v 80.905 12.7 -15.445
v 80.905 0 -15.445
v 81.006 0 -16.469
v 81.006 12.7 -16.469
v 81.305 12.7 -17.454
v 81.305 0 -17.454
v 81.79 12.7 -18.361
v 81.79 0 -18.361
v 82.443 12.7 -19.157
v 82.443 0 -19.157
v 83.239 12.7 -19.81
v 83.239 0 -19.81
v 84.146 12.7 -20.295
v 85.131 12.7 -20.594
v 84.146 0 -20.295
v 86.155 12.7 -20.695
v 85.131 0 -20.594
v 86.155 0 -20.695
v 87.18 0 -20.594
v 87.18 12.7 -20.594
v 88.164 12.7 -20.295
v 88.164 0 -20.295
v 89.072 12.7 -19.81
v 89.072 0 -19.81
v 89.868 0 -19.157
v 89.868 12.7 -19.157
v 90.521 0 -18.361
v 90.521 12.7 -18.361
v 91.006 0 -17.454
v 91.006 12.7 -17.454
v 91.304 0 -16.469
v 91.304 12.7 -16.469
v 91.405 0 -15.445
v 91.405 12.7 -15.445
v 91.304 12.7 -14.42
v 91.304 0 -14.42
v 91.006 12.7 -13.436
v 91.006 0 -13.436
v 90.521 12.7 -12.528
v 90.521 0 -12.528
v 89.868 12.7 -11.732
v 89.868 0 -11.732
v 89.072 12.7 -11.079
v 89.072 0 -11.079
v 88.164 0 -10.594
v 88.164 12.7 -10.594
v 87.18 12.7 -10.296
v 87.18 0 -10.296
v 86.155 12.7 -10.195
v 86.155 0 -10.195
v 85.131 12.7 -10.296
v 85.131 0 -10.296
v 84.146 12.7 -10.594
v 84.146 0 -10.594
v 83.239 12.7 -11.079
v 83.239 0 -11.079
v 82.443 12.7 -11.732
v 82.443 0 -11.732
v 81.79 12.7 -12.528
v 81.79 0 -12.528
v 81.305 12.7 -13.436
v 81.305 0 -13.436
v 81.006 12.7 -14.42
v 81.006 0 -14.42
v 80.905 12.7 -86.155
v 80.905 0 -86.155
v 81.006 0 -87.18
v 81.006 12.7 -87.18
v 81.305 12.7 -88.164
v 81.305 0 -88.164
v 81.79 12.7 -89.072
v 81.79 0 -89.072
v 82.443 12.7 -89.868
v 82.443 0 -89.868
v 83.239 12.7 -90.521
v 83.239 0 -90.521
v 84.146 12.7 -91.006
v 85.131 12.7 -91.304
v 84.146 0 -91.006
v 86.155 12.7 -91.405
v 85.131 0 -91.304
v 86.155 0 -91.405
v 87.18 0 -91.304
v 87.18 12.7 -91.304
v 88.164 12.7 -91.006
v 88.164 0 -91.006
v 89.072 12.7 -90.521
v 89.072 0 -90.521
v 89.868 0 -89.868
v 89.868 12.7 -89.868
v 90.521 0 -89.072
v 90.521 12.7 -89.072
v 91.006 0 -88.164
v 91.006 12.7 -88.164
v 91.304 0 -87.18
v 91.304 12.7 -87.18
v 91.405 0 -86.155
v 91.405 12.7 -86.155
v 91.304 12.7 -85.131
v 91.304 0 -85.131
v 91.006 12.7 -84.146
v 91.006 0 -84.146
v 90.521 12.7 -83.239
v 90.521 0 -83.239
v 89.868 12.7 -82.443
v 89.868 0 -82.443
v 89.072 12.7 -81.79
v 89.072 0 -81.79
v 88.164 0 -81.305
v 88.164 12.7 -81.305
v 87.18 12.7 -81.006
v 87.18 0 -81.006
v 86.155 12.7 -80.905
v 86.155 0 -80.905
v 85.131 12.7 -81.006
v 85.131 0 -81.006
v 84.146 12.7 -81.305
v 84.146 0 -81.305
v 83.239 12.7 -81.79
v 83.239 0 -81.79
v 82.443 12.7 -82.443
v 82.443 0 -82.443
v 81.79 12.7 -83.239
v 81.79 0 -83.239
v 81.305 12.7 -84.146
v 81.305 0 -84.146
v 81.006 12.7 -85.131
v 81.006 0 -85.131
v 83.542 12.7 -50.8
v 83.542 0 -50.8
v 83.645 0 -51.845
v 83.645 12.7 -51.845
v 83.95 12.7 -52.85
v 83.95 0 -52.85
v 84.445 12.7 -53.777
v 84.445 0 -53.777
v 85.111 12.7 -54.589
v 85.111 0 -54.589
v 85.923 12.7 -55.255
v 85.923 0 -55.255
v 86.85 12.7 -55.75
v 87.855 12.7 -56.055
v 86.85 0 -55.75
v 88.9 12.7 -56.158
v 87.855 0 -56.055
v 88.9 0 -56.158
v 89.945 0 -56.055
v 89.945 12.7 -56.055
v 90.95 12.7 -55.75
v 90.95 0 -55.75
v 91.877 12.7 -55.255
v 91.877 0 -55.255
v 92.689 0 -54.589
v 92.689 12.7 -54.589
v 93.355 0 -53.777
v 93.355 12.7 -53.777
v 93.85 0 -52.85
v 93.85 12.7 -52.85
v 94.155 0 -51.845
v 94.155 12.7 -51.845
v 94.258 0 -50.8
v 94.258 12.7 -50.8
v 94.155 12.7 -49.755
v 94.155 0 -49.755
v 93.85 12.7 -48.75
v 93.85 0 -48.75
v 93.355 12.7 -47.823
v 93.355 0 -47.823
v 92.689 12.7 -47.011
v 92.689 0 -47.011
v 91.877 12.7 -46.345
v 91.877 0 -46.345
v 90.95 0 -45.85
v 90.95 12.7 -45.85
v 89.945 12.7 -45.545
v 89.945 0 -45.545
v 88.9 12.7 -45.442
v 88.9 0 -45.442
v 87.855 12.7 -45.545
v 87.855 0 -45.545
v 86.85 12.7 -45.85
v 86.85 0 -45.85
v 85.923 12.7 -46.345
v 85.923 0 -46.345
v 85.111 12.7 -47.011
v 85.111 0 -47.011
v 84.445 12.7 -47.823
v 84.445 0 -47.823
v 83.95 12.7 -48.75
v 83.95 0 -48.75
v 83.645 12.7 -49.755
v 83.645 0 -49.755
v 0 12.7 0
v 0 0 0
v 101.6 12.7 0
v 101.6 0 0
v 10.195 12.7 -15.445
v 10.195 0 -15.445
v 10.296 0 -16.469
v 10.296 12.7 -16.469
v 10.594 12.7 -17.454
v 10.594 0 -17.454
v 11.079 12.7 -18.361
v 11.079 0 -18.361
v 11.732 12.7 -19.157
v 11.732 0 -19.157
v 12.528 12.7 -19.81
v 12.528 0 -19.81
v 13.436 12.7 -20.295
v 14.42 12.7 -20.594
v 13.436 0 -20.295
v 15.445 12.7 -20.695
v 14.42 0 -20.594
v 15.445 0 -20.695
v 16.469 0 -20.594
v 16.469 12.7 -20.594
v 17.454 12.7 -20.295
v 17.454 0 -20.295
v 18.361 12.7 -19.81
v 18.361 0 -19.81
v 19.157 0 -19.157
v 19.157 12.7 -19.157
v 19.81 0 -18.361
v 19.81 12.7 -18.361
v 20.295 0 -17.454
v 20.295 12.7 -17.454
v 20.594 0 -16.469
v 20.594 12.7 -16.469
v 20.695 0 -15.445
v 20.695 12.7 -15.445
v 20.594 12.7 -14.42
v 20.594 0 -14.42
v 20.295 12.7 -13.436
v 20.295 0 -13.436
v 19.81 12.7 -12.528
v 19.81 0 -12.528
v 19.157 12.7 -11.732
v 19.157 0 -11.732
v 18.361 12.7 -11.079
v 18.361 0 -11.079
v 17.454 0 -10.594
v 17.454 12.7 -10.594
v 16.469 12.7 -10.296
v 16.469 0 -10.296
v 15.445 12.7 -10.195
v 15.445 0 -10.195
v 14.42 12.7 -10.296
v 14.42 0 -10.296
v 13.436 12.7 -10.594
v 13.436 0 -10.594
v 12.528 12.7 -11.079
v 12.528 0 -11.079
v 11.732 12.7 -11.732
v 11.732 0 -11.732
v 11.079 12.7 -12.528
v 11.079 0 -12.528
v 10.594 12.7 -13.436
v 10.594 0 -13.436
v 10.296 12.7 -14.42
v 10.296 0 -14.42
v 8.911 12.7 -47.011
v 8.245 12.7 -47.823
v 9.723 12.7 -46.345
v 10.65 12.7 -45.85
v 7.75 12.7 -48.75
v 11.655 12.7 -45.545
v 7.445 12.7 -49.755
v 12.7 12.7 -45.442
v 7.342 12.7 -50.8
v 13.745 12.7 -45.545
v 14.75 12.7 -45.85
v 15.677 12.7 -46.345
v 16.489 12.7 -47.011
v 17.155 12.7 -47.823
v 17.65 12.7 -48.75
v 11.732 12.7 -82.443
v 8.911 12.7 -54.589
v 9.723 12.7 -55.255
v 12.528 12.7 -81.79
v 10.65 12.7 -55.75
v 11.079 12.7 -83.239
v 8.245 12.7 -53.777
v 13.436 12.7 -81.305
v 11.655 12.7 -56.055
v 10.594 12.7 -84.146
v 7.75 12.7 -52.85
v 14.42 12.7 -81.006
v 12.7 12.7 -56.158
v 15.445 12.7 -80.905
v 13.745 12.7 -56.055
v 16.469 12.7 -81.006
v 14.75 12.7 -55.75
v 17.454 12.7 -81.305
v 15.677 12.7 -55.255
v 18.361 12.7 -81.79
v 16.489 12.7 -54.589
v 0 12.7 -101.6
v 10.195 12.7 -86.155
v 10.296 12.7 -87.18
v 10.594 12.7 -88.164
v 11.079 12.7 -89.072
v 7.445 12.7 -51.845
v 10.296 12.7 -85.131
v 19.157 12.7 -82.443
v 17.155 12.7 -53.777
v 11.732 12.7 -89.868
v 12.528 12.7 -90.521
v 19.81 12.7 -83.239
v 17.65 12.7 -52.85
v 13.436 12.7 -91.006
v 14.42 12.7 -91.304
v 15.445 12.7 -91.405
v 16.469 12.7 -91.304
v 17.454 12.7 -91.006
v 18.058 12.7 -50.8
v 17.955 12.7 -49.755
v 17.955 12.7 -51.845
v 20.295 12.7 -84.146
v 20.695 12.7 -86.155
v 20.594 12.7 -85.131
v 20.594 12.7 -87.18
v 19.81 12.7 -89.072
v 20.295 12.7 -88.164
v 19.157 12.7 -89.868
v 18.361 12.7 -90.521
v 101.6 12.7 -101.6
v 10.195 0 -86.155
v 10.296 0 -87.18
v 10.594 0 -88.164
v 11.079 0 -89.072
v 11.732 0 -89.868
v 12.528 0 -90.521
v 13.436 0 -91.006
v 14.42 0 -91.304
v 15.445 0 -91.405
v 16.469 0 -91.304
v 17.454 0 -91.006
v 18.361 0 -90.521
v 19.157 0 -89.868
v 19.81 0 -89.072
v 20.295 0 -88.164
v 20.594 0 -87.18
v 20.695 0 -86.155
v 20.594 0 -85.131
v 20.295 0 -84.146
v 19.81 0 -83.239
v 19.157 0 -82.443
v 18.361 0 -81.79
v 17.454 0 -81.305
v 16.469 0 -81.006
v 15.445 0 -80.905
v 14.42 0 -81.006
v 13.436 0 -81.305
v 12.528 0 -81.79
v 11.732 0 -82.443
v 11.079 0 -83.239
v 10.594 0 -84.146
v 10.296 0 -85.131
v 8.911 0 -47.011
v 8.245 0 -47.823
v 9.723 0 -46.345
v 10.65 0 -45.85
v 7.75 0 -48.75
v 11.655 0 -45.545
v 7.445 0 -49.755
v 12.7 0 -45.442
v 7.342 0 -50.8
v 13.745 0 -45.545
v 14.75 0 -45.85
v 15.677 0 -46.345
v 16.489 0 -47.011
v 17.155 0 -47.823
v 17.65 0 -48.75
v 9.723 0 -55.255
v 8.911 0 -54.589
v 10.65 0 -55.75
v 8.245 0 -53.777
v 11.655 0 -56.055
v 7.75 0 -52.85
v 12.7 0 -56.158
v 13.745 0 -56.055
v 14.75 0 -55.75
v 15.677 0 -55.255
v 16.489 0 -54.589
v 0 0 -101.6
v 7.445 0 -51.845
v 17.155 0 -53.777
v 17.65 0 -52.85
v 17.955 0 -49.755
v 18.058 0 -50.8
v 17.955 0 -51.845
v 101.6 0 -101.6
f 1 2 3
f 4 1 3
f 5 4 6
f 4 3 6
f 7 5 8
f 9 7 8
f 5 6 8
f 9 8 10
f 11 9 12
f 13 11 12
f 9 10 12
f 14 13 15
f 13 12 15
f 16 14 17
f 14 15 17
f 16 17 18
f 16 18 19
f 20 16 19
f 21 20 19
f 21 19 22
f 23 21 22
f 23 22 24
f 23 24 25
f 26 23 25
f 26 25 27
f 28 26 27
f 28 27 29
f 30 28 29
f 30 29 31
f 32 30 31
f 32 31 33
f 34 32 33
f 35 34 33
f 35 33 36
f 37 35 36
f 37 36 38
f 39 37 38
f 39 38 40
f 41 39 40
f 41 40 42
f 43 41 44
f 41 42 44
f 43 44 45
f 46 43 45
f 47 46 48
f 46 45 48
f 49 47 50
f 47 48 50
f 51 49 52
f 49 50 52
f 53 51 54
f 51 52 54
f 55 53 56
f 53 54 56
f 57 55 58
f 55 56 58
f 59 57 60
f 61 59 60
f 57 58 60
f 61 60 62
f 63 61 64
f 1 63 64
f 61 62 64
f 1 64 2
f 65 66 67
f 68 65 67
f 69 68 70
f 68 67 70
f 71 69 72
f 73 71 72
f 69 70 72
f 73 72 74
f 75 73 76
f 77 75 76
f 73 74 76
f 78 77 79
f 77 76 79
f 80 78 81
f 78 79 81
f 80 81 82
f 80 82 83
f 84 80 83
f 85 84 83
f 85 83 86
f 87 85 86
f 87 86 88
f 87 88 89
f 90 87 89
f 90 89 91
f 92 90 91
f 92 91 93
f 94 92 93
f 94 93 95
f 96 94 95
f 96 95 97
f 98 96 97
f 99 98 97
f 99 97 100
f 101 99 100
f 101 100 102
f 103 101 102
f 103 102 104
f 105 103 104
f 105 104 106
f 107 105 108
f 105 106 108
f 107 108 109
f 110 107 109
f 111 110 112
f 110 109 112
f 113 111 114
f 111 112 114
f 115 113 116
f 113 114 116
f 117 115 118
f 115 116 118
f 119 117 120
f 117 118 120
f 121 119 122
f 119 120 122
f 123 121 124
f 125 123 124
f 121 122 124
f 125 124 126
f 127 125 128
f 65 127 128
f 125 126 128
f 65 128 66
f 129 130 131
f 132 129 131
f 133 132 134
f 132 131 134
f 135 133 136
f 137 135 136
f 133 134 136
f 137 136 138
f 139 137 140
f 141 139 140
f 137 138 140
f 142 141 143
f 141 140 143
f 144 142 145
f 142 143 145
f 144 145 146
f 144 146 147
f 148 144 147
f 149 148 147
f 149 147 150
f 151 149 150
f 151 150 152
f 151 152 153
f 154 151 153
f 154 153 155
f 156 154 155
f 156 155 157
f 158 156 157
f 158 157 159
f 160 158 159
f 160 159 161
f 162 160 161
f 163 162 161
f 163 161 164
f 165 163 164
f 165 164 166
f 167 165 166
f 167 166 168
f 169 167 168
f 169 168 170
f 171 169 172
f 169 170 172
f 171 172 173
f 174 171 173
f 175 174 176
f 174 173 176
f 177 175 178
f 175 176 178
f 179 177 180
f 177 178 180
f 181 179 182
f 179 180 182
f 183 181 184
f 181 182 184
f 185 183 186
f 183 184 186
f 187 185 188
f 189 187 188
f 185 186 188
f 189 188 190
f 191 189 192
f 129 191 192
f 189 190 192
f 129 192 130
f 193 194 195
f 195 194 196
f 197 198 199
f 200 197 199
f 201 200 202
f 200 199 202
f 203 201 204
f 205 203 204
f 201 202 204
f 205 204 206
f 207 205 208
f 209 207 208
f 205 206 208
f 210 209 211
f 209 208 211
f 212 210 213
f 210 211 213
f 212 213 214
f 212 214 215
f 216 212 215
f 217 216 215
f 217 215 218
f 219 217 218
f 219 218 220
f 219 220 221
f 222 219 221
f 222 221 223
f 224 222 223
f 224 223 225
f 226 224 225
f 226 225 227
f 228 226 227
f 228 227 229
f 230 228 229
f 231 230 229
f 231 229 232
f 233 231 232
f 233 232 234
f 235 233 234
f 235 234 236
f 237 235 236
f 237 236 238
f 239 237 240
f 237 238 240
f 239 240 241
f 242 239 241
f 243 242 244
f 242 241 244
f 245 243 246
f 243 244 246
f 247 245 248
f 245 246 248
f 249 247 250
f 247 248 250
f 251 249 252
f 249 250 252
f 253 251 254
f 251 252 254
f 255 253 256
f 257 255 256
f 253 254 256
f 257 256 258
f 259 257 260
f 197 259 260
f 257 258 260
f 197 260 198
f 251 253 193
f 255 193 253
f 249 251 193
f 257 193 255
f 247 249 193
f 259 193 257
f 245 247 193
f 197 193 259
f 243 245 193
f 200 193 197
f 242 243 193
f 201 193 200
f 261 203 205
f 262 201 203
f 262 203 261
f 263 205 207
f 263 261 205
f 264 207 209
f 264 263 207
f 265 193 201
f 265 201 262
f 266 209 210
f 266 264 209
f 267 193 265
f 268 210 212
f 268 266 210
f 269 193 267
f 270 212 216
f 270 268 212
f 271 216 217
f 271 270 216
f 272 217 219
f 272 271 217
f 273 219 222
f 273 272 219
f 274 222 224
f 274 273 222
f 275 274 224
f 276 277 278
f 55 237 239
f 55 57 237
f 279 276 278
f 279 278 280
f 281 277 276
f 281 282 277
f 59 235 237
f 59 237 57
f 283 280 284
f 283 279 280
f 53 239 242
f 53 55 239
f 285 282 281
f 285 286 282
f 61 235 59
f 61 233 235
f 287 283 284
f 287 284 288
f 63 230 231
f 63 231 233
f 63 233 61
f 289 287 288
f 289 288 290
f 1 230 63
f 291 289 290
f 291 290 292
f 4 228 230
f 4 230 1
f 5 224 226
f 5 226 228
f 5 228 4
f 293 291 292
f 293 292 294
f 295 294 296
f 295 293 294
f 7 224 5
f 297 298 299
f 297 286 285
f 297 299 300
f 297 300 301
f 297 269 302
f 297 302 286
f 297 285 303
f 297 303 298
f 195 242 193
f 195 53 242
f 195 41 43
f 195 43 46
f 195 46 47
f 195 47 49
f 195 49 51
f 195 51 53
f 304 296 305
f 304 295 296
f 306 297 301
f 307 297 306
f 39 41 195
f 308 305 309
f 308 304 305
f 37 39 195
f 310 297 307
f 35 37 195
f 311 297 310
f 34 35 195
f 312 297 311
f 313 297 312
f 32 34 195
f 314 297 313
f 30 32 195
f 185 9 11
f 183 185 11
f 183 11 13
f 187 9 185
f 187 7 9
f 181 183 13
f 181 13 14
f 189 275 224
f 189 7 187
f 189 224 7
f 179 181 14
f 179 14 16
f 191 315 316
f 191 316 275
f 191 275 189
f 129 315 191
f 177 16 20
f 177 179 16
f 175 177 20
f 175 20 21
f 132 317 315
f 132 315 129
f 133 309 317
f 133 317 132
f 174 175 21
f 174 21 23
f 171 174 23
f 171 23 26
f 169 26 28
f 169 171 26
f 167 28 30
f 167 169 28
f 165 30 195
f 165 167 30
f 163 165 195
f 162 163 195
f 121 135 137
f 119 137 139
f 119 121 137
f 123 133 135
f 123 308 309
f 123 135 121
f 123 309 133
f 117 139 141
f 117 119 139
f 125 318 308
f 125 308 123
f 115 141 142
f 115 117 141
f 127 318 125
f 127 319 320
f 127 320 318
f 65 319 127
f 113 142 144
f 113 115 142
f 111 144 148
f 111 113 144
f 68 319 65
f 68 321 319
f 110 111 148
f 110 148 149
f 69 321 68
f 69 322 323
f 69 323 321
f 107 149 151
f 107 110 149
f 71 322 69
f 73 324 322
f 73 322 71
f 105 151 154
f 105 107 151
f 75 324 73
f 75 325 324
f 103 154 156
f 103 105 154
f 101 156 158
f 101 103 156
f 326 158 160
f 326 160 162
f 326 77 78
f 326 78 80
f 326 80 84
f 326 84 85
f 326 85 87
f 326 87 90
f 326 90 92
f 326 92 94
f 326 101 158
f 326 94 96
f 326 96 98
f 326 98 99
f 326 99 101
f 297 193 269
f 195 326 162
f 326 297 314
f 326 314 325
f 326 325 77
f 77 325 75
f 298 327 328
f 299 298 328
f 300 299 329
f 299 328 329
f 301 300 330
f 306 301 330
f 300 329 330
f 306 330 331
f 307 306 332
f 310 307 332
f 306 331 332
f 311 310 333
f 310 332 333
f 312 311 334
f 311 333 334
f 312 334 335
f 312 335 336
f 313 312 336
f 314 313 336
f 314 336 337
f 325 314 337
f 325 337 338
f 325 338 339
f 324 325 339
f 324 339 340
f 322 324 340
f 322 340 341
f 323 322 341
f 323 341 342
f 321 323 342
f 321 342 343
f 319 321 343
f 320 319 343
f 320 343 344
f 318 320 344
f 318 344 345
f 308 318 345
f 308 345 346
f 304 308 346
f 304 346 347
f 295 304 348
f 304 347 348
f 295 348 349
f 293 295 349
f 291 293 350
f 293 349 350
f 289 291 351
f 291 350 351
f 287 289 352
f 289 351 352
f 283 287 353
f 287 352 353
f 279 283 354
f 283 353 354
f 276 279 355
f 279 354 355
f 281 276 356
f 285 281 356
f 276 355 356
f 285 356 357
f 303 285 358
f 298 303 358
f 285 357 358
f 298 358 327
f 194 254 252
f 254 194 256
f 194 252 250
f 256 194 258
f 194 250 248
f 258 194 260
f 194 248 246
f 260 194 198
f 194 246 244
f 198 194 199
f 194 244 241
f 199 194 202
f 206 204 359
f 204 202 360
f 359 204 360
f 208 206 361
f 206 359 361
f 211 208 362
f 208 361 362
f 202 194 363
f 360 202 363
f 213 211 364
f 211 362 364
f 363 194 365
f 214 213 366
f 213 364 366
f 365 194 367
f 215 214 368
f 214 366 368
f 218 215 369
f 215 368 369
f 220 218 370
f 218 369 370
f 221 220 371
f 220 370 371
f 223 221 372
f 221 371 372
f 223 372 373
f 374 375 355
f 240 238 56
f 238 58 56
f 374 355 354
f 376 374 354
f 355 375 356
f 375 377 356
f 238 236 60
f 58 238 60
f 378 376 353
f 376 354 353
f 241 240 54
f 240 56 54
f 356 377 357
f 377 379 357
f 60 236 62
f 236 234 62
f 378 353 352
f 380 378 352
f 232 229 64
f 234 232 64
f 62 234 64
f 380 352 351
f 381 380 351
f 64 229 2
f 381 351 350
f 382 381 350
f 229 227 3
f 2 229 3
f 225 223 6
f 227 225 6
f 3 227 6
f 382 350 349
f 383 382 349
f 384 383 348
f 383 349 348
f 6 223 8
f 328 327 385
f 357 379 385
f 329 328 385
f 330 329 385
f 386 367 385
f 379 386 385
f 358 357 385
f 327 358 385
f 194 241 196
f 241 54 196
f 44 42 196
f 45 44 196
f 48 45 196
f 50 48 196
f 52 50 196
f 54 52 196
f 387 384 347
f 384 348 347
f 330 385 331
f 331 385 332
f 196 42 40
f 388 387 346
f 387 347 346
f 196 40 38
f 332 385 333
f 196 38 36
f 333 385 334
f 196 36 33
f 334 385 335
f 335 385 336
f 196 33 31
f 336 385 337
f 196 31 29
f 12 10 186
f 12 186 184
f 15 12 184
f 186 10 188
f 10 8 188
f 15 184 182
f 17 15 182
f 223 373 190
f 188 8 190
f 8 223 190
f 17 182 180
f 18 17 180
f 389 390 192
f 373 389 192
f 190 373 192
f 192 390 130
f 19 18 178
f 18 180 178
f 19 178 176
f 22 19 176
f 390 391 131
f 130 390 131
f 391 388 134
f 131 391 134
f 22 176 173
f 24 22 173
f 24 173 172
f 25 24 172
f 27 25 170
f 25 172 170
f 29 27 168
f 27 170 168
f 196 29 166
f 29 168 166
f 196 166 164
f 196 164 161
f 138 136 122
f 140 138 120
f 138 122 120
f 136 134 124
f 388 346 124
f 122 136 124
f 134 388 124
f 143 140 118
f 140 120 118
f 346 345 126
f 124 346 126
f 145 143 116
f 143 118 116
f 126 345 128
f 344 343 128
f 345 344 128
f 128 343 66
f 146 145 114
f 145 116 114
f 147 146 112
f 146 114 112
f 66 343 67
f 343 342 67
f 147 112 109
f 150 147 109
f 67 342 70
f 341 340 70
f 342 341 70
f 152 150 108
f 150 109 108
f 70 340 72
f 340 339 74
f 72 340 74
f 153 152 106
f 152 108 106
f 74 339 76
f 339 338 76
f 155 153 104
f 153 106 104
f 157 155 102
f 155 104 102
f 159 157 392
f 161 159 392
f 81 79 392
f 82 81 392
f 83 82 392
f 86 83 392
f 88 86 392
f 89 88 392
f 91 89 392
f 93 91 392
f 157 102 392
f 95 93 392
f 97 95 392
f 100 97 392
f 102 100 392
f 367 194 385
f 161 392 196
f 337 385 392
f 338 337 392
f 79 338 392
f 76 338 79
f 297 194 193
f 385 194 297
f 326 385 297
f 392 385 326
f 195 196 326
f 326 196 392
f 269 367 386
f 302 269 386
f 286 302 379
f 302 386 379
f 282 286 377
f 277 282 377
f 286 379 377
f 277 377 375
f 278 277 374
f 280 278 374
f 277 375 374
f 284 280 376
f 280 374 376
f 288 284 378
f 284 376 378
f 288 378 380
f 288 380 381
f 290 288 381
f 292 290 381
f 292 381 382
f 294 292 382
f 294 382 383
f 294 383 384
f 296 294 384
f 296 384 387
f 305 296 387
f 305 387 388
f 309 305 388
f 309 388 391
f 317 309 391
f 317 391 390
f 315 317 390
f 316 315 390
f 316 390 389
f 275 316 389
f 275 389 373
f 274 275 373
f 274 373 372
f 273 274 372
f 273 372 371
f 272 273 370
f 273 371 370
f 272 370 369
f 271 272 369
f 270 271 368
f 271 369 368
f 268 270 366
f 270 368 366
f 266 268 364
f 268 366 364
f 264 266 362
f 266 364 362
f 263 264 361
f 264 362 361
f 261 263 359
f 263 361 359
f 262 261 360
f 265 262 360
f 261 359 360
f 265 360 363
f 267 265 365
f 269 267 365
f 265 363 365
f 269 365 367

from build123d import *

# Parameters (mm, degrees)
SKETCH1_W               = 101.6
SKETCH1_H               = 101.6
BOSS_EXTRUDE1_DEPTH     = 12.7
M10_CLEARANCE_HOLE1_D   = 10.5
F_1_2_13_TAPPED_HOLE1_D = 10.71626


with BuildPart() as part:
    # Sketch1 → Boss-Extrude1 (new body)
    with BuildSketch(Plane(origin=(0, 0, 0), x_dir=(1, 0, 0), z_dir=(0, 1, 0))):
        with Locations((50.8, 50.8)):
            Rectangle(SKETCH1_W, SKETCH1_H)
    extrude(amount=BOSS_EXTRUDE1_DEPTH)

    # M10 Clearance Hole1 (through all)
    with Locations(Plane(origin=(0, 12.7, 0), x_dir=(1, 0, 0), z_dir=(0, 1, 0))):
        with Locations((86.155339059, 86.155339059), (86.155339059, 15.444660941), (15.444660941, 86.155339059), (15.444660941, 15.444660941)):
            Hole(M10_CLEARANCE_HOLE1_D / 2)

    # 1/2-13 Tapped Hole1 (through all)
    with Locations(Plane(origin=(0, 12.7, 0), x_dir=(1, 0, 0), z_dir=(0, 1, 0))):
        with Locations((88.9, 50.8), (12.7, 50.8)):
            Hole(F_1_2_13_TAPPED_HOLE1_D / 2)


solid = part.part
